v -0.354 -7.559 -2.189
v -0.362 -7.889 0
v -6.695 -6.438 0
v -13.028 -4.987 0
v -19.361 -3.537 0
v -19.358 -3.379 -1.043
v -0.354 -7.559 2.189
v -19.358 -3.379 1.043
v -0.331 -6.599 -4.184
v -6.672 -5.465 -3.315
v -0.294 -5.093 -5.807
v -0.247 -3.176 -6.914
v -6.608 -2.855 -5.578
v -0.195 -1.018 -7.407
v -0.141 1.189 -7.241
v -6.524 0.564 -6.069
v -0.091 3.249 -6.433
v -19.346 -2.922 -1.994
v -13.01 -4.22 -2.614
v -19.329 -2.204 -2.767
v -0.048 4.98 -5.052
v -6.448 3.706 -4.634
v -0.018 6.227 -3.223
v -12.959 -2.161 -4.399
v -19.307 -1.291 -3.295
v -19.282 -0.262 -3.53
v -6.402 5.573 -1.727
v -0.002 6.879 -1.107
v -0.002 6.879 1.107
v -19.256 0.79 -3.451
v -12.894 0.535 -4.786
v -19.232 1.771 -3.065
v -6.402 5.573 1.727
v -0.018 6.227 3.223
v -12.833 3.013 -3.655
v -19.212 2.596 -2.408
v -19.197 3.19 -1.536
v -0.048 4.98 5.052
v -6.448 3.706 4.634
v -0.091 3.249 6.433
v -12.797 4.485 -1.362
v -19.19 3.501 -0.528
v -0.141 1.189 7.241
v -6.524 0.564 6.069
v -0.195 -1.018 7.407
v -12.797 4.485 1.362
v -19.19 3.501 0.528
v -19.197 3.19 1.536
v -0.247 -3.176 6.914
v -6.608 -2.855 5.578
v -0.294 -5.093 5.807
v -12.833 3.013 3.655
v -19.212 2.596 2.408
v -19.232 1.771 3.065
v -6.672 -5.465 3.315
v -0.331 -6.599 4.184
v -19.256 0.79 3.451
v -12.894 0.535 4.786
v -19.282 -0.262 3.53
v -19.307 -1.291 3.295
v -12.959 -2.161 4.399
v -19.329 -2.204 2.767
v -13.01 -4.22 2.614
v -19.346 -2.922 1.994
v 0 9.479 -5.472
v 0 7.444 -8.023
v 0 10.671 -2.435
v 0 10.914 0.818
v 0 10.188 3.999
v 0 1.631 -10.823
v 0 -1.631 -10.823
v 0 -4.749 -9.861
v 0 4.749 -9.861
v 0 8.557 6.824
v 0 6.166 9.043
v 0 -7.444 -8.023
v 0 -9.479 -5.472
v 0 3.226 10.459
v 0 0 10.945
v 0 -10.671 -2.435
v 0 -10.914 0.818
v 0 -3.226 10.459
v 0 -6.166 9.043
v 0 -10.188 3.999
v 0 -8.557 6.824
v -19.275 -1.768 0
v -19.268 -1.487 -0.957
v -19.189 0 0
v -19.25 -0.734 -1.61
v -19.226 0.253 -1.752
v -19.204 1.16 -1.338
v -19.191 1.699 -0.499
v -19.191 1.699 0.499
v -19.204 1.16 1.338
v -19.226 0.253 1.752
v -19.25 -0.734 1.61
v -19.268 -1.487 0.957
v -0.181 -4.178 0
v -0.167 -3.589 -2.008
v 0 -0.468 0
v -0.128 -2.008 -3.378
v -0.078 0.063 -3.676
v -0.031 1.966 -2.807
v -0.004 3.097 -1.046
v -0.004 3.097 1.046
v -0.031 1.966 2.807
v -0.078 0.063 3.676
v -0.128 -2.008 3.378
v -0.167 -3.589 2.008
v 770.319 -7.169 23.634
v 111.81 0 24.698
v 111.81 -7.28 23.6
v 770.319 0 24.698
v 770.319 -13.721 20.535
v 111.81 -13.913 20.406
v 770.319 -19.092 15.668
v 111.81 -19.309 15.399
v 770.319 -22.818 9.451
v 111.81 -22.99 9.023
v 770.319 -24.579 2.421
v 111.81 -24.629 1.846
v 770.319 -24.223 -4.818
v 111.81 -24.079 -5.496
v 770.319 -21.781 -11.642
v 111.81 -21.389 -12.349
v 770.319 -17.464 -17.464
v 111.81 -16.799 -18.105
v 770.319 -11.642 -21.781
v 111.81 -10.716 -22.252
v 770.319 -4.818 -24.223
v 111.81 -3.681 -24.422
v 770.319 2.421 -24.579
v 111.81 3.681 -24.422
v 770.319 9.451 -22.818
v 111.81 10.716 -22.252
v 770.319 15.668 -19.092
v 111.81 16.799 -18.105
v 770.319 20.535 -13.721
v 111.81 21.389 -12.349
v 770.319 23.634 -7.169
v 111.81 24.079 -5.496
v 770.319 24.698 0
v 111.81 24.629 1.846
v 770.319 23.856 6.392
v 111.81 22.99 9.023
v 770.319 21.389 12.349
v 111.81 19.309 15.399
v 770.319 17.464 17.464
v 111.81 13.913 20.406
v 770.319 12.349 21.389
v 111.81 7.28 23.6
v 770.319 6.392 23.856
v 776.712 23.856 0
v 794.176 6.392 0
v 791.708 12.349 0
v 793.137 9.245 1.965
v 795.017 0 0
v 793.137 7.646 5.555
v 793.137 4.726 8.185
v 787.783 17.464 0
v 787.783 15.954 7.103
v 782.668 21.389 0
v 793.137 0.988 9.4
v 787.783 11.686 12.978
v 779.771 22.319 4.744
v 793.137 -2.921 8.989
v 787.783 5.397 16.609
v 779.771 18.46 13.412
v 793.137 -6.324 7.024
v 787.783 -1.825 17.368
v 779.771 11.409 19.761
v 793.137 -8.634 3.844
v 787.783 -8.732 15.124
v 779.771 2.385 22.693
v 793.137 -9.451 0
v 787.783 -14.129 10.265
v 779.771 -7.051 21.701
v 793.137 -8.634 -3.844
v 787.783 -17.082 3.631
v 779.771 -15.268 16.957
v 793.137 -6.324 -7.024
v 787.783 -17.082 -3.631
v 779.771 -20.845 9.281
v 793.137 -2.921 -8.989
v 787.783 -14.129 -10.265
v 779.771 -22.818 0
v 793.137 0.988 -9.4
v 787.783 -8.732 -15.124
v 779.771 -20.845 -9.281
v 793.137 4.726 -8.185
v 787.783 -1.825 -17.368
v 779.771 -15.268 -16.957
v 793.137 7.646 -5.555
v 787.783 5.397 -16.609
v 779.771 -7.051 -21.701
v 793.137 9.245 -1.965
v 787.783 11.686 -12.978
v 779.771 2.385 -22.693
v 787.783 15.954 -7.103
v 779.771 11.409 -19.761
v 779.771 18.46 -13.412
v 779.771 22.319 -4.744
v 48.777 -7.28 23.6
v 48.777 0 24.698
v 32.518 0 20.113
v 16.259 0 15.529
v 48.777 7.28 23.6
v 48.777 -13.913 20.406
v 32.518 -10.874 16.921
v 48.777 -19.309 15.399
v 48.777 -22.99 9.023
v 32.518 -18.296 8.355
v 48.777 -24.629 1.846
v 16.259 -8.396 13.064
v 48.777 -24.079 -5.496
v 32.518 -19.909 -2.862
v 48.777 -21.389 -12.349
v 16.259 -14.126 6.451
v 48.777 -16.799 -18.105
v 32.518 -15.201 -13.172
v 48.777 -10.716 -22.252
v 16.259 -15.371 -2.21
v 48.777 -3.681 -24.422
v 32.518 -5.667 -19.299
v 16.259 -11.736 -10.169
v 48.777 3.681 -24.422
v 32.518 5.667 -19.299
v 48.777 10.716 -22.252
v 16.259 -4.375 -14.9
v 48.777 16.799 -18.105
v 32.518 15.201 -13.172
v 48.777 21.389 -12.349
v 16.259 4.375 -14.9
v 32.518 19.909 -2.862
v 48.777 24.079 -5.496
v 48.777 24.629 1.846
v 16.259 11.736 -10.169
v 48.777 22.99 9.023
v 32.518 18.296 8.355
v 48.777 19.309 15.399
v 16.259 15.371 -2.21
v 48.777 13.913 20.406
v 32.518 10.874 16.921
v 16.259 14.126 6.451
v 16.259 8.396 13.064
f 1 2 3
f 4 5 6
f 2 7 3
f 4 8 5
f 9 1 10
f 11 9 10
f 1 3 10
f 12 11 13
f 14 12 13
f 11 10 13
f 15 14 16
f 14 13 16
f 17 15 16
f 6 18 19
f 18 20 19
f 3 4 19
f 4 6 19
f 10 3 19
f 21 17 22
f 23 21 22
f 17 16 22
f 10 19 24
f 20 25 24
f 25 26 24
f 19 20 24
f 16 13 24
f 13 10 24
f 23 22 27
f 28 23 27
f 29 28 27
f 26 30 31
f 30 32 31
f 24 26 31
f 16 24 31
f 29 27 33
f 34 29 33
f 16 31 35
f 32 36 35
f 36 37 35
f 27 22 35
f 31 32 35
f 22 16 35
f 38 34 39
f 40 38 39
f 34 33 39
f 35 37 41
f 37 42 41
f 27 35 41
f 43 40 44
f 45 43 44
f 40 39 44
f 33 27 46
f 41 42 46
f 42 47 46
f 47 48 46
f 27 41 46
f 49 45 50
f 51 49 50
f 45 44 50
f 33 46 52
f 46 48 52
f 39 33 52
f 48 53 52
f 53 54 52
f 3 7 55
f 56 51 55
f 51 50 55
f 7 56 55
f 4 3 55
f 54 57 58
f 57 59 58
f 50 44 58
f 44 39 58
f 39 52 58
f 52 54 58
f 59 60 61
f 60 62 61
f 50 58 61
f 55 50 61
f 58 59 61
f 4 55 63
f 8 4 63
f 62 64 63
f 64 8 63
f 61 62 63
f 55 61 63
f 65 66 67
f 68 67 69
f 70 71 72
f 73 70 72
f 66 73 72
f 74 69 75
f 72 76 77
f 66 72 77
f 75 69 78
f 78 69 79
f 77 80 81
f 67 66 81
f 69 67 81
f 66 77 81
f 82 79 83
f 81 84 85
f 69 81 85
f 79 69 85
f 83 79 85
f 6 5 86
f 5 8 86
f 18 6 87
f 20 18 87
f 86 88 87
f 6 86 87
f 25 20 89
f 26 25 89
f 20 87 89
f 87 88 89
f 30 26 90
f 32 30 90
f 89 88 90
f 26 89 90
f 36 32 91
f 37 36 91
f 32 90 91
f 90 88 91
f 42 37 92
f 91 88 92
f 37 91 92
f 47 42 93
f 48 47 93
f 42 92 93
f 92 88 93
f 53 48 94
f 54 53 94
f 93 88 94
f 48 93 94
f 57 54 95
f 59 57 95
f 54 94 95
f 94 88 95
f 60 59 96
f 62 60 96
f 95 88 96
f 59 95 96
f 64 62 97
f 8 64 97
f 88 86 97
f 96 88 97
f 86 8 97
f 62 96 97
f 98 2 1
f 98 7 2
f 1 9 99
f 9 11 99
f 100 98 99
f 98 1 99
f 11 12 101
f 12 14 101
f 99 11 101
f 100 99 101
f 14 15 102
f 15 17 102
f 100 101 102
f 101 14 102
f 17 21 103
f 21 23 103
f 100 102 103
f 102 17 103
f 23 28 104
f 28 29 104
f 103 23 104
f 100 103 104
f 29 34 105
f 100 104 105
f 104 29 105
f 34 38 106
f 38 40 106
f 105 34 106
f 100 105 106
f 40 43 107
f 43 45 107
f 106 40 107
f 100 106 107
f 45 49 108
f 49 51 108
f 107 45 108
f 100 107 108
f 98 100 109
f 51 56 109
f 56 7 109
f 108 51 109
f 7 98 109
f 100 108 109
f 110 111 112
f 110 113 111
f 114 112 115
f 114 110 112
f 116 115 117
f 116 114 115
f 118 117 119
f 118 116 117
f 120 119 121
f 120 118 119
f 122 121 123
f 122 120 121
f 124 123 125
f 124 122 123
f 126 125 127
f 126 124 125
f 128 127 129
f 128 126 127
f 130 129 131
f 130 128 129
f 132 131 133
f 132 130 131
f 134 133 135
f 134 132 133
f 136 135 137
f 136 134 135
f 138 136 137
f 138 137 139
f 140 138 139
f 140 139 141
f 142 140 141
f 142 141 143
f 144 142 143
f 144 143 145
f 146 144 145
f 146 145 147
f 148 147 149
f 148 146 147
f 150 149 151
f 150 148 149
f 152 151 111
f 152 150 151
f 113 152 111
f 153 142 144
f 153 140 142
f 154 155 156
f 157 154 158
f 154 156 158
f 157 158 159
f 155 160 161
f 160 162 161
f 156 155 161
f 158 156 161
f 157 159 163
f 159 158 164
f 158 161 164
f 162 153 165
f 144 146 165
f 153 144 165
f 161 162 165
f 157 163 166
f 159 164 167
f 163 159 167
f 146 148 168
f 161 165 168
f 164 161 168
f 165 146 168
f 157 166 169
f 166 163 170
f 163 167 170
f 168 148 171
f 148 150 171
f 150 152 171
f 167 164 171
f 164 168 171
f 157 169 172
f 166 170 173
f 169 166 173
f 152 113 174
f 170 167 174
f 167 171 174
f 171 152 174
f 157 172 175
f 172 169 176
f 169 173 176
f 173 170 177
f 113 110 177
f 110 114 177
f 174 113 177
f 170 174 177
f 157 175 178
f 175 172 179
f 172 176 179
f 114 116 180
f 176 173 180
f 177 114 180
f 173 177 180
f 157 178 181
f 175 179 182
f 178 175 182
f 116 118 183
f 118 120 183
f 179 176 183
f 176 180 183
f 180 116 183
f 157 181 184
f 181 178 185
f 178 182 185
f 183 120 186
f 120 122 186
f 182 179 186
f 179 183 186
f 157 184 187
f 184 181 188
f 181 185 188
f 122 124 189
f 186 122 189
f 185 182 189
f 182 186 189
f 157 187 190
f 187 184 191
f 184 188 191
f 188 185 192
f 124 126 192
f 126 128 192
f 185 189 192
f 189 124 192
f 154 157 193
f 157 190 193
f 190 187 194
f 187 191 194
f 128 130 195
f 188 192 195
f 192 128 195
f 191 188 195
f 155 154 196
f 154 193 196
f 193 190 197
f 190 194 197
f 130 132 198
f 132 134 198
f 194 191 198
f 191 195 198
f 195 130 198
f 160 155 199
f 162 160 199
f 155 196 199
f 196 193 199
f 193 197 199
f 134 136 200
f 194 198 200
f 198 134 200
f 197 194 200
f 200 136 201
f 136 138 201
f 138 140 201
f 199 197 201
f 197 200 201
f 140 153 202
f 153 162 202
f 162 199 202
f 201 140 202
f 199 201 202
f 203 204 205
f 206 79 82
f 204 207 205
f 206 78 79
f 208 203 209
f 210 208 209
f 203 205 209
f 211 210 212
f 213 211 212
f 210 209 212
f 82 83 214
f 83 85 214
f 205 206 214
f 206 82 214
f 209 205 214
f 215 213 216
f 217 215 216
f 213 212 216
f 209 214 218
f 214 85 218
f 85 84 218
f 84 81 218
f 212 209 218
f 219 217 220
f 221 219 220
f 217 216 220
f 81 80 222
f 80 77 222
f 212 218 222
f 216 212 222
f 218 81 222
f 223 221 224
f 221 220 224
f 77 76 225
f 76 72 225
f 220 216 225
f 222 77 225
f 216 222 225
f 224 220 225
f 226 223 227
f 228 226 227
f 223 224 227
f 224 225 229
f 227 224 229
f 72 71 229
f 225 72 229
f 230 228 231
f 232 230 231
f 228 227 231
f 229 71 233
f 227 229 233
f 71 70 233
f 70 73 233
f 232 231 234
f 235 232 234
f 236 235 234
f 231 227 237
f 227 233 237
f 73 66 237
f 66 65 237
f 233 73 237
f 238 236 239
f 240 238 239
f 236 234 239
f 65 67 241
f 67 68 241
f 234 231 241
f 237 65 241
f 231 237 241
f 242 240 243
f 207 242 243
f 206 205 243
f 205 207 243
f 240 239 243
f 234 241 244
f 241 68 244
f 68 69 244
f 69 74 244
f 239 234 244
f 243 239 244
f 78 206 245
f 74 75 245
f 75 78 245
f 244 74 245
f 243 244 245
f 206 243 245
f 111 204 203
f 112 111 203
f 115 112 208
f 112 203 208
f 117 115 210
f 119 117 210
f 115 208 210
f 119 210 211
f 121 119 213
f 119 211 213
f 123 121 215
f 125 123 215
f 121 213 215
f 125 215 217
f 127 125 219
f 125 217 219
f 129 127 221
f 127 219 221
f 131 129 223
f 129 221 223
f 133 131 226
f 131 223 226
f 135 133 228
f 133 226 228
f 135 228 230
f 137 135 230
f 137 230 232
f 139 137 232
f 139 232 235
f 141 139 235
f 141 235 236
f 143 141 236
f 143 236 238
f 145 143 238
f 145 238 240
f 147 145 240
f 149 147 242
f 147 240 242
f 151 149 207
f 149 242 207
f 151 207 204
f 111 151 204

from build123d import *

# Parameters (mm, degrees)
SKETCH_9_W = 658.509048611
SKETCH_9_H = 24.697729226


with BuildPart() as part:
    # 草图4 → 旋转2 (revolve)
    with BuildSketch(Plane.XY, mode=Mode.PRIVATE) as revolve_2_sk:
        Polygon((0, 0), (111.810339883, 0), (111.810339883, 24.697729226), (48.776692206, 24.697729226), (0, 10.944933369), align=None)
    revolve(revolve_2_sk.sketch.rotate(Axis((0, 0, 0), (1, 0, 0)), 90), axis=Axis((0, 0, 0), (1, 0, 0)))

    # 草图9 → 旋转4 (revolve)
    with BuildSketch(Plane.XY, mode=Mode.PRIVATE) as revolve_4_sk:
        with Locations((441.064864188, 12.348864613)):
            Rectangle(SKETCH_9_W, SKETCH_9_H)
    revolve(revolve_4_sk.sketch.rotate(Axis((111.810339883, 0, 0), (1, 0, 0)), 90), axis=Axis((111.810339883, 0, 0), (1, 0, 0)))

    # 草图10 → 旋转5 (revolve)
    with BuildSketch(Plane.XY):
        with BuildLine():
            Line((770.319388494, 0), (795.01711772, 0))
            ThreePointArc((795.01711772, 0), (787.78332031, 17.463931816), (770.319388494, 24.697729226))
            Line((770.319388494, 24.697729226), (770.319388494, 0))
        make_face()
    revolve(axis=Axis((0, 0, 0), (1, 0, 0)))


with BuildPart() as body_2:
    # 草图6 → 旋转3 (revolve)
    with BuildSketch(Plane.XY, mode=Mode.PRIVATE) as revolve_3_sk:
        Polygon((0, -0.46798709), (0, 6.961864729), (-19.188758431, 3.540723799), (-19.188758431, 0), align=None)
    revolve(revolve_3_sk.sketch.rotate(Axis((-19.188758431, 0, 0), (0.9997027305288129, -0.024381357083554822, 0)), 180), axis=Axis((-19.188758431, 0, 0), (0.9997027305288129, -0.024381357083554822, 0)))


solid = Compound([part.part, body_2.part])
